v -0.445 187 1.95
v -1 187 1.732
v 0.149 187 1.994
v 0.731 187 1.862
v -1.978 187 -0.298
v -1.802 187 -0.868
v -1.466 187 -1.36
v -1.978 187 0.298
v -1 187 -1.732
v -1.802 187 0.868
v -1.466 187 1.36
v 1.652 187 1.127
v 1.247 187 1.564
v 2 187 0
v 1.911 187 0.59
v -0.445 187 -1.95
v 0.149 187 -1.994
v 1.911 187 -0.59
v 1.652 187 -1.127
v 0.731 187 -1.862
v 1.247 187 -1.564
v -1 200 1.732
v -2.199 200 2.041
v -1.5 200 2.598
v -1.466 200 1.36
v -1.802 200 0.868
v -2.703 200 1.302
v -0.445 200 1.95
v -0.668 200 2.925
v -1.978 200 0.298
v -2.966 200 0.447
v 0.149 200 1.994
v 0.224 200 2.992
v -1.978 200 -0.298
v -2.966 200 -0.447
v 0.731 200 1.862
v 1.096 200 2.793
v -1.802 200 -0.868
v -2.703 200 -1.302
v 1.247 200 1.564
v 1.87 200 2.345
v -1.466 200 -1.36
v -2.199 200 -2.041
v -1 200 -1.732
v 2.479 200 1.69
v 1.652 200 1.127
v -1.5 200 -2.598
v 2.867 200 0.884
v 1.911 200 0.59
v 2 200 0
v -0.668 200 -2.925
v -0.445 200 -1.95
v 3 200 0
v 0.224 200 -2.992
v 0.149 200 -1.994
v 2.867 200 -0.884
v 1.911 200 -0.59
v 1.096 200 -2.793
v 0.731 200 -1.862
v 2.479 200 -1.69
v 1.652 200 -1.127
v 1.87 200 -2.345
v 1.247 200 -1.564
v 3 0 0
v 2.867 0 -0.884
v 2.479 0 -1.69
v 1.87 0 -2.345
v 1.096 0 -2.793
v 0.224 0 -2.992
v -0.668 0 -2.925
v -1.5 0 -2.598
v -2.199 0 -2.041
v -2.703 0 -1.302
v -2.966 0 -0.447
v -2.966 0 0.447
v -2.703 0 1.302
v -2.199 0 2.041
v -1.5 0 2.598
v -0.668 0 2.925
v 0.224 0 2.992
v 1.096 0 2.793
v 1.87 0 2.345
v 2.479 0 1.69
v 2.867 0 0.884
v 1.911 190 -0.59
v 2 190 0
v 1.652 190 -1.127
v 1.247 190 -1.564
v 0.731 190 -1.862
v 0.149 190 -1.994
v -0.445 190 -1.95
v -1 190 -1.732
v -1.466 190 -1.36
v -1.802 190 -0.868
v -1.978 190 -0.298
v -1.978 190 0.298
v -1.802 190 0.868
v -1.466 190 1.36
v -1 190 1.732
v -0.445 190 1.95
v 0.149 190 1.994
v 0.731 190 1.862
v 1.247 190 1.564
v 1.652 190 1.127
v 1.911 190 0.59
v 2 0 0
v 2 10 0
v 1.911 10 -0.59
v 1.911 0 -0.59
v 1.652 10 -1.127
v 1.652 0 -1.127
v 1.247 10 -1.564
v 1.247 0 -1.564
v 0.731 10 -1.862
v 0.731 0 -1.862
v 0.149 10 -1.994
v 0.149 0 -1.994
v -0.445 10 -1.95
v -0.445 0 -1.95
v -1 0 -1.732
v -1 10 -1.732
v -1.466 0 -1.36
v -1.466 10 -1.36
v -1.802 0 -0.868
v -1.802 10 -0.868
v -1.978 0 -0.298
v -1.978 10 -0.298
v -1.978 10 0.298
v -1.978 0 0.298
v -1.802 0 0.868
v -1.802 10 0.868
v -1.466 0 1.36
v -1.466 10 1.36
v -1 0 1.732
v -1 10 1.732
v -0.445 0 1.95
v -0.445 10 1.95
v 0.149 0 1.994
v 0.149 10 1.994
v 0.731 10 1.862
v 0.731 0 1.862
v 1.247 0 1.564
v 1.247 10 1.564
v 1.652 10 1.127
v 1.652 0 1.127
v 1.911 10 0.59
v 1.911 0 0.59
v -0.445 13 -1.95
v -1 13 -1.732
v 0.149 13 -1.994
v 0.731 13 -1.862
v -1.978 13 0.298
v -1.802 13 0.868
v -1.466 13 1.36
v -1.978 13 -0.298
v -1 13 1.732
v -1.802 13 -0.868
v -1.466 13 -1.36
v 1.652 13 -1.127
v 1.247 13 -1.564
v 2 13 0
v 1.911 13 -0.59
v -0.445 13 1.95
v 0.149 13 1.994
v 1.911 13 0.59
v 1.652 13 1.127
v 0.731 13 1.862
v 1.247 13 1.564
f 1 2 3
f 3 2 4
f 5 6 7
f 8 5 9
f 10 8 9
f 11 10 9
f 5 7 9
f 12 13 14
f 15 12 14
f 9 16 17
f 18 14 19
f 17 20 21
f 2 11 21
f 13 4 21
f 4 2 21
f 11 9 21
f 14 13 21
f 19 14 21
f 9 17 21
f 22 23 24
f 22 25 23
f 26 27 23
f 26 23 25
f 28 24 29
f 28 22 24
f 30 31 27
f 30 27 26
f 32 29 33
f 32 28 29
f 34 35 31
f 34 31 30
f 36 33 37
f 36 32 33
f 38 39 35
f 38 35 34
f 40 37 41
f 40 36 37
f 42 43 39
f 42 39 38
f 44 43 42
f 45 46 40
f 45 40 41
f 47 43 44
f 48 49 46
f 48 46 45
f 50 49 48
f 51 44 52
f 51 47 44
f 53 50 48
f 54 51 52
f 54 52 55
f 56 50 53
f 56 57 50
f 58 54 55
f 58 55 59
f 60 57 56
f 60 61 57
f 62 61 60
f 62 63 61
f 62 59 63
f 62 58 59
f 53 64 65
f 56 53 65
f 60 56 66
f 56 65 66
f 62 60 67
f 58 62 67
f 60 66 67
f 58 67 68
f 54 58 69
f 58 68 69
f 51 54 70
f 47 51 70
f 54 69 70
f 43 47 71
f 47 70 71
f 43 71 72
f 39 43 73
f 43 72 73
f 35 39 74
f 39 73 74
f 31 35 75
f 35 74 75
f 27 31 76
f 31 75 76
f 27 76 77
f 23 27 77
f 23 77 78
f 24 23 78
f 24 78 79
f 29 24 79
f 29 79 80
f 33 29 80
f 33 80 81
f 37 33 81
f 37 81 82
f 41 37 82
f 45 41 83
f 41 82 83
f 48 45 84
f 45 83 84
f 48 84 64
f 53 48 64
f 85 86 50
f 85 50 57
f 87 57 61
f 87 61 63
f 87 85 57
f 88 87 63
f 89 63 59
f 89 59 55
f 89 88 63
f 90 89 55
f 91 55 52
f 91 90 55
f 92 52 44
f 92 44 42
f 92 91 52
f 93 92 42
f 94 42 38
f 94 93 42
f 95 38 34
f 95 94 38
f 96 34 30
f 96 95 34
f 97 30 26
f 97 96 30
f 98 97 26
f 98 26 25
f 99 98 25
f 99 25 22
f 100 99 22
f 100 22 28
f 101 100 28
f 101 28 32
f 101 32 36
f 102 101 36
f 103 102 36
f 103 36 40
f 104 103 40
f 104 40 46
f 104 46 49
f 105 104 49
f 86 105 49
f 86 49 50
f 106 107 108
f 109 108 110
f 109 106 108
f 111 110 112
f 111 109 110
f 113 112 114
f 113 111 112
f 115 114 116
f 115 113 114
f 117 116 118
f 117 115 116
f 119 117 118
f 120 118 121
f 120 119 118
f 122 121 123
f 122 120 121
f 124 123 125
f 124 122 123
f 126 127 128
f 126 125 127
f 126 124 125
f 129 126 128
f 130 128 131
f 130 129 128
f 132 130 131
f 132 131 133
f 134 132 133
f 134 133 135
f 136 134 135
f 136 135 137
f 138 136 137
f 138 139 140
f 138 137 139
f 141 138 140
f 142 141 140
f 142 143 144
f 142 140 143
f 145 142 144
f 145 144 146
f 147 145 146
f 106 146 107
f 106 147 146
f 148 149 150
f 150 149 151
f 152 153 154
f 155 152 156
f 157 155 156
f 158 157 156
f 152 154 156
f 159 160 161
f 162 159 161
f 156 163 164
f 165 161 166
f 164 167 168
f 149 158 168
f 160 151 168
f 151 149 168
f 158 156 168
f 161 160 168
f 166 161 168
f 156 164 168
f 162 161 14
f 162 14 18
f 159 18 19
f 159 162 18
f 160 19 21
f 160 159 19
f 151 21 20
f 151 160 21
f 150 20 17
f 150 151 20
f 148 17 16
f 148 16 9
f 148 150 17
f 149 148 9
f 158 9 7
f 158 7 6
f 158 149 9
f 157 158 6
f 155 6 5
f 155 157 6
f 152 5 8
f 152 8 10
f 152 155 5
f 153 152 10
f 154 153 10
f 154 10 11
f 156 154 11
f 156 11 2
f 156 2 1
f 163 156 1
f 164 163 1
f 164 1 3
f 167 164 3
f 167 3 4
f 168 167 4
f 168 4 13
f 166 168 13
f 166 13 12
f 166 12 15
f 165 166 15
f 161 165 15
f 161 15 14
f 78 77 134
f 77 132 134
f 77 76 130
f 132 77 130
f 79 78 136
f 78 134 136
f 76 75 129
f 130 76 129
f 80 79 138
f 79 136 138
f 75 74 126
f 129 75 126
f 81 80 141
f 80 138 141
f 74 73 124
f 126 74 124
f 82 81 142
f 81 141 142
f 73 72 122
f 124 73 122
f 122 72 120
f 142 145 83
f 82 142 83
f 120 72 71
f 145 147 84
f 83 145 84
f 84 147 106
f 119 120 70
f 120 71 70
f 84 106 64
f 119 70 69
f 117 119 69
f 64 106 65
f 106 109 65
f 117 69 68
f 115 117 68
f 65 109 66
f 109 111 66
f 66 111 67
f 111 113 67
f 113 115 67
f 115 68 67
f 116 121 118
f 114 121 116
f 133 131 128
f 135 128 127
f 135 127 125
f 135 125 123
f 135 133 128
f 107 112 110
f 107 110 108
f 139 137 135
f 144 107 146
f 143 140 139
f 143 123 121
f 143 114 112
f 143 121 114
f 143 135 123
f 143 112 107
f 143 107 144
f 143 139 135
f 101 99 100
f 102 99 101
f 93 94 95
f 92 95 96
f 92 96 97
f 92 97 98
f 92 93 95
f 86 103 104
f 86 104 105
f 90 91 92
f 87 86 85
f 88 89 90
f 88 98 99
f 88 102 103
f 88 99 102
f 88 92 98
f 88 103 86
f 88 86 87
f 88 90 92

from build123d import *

# Parameters (mm, degrees)
SKETCH_1_R      = 3
SKETCH_1_R_2    = 2
EXTRUDE_1_DEPTH = 200
EXTRUDE_START   = -10
SKETCH_2_R      = 2
EXTRUDE_2_DEPTH = 3
SKETCH_3_R      = 2
EXTRUDE_3_DEPTH = 3


with BuildPart() as part:
    # 스케치1 → 보스-돌출1 (new body)
    with BuildSketch(Plane(origin=(0, 0, 0), x_dir=(1, 0, 0), z_dir=(0, 1, 0))):
        Circle(SKETCH_1_R)
        Circle(SKETCH_1_R_2, mode=Mode.SUBTRACT)
    extrude(amount=EXTRUDE_1_DEPTH)

    # 스케치2 → 보스-돌출2 (add)
    with BuildSketch(Plane.XZ.offset(EXTRUDE_START)):
        Circle(SKETCH_2_R)
    extrude(amount=-EXTRUDE_2_DEPTH)

    # 스케치3 → 보스-돌출3 (add)
    with BuildSketch(Plane(origin=(0, 200, 0), x_dir=(1, 0, 0), z_dir=(0, 1, 0)).offset(EXTRUDE_START)):
        Circle(SKETCH_3_R)
    extrude(amount=-EXTRUDE_3_DEPTH)


solid = part.part
